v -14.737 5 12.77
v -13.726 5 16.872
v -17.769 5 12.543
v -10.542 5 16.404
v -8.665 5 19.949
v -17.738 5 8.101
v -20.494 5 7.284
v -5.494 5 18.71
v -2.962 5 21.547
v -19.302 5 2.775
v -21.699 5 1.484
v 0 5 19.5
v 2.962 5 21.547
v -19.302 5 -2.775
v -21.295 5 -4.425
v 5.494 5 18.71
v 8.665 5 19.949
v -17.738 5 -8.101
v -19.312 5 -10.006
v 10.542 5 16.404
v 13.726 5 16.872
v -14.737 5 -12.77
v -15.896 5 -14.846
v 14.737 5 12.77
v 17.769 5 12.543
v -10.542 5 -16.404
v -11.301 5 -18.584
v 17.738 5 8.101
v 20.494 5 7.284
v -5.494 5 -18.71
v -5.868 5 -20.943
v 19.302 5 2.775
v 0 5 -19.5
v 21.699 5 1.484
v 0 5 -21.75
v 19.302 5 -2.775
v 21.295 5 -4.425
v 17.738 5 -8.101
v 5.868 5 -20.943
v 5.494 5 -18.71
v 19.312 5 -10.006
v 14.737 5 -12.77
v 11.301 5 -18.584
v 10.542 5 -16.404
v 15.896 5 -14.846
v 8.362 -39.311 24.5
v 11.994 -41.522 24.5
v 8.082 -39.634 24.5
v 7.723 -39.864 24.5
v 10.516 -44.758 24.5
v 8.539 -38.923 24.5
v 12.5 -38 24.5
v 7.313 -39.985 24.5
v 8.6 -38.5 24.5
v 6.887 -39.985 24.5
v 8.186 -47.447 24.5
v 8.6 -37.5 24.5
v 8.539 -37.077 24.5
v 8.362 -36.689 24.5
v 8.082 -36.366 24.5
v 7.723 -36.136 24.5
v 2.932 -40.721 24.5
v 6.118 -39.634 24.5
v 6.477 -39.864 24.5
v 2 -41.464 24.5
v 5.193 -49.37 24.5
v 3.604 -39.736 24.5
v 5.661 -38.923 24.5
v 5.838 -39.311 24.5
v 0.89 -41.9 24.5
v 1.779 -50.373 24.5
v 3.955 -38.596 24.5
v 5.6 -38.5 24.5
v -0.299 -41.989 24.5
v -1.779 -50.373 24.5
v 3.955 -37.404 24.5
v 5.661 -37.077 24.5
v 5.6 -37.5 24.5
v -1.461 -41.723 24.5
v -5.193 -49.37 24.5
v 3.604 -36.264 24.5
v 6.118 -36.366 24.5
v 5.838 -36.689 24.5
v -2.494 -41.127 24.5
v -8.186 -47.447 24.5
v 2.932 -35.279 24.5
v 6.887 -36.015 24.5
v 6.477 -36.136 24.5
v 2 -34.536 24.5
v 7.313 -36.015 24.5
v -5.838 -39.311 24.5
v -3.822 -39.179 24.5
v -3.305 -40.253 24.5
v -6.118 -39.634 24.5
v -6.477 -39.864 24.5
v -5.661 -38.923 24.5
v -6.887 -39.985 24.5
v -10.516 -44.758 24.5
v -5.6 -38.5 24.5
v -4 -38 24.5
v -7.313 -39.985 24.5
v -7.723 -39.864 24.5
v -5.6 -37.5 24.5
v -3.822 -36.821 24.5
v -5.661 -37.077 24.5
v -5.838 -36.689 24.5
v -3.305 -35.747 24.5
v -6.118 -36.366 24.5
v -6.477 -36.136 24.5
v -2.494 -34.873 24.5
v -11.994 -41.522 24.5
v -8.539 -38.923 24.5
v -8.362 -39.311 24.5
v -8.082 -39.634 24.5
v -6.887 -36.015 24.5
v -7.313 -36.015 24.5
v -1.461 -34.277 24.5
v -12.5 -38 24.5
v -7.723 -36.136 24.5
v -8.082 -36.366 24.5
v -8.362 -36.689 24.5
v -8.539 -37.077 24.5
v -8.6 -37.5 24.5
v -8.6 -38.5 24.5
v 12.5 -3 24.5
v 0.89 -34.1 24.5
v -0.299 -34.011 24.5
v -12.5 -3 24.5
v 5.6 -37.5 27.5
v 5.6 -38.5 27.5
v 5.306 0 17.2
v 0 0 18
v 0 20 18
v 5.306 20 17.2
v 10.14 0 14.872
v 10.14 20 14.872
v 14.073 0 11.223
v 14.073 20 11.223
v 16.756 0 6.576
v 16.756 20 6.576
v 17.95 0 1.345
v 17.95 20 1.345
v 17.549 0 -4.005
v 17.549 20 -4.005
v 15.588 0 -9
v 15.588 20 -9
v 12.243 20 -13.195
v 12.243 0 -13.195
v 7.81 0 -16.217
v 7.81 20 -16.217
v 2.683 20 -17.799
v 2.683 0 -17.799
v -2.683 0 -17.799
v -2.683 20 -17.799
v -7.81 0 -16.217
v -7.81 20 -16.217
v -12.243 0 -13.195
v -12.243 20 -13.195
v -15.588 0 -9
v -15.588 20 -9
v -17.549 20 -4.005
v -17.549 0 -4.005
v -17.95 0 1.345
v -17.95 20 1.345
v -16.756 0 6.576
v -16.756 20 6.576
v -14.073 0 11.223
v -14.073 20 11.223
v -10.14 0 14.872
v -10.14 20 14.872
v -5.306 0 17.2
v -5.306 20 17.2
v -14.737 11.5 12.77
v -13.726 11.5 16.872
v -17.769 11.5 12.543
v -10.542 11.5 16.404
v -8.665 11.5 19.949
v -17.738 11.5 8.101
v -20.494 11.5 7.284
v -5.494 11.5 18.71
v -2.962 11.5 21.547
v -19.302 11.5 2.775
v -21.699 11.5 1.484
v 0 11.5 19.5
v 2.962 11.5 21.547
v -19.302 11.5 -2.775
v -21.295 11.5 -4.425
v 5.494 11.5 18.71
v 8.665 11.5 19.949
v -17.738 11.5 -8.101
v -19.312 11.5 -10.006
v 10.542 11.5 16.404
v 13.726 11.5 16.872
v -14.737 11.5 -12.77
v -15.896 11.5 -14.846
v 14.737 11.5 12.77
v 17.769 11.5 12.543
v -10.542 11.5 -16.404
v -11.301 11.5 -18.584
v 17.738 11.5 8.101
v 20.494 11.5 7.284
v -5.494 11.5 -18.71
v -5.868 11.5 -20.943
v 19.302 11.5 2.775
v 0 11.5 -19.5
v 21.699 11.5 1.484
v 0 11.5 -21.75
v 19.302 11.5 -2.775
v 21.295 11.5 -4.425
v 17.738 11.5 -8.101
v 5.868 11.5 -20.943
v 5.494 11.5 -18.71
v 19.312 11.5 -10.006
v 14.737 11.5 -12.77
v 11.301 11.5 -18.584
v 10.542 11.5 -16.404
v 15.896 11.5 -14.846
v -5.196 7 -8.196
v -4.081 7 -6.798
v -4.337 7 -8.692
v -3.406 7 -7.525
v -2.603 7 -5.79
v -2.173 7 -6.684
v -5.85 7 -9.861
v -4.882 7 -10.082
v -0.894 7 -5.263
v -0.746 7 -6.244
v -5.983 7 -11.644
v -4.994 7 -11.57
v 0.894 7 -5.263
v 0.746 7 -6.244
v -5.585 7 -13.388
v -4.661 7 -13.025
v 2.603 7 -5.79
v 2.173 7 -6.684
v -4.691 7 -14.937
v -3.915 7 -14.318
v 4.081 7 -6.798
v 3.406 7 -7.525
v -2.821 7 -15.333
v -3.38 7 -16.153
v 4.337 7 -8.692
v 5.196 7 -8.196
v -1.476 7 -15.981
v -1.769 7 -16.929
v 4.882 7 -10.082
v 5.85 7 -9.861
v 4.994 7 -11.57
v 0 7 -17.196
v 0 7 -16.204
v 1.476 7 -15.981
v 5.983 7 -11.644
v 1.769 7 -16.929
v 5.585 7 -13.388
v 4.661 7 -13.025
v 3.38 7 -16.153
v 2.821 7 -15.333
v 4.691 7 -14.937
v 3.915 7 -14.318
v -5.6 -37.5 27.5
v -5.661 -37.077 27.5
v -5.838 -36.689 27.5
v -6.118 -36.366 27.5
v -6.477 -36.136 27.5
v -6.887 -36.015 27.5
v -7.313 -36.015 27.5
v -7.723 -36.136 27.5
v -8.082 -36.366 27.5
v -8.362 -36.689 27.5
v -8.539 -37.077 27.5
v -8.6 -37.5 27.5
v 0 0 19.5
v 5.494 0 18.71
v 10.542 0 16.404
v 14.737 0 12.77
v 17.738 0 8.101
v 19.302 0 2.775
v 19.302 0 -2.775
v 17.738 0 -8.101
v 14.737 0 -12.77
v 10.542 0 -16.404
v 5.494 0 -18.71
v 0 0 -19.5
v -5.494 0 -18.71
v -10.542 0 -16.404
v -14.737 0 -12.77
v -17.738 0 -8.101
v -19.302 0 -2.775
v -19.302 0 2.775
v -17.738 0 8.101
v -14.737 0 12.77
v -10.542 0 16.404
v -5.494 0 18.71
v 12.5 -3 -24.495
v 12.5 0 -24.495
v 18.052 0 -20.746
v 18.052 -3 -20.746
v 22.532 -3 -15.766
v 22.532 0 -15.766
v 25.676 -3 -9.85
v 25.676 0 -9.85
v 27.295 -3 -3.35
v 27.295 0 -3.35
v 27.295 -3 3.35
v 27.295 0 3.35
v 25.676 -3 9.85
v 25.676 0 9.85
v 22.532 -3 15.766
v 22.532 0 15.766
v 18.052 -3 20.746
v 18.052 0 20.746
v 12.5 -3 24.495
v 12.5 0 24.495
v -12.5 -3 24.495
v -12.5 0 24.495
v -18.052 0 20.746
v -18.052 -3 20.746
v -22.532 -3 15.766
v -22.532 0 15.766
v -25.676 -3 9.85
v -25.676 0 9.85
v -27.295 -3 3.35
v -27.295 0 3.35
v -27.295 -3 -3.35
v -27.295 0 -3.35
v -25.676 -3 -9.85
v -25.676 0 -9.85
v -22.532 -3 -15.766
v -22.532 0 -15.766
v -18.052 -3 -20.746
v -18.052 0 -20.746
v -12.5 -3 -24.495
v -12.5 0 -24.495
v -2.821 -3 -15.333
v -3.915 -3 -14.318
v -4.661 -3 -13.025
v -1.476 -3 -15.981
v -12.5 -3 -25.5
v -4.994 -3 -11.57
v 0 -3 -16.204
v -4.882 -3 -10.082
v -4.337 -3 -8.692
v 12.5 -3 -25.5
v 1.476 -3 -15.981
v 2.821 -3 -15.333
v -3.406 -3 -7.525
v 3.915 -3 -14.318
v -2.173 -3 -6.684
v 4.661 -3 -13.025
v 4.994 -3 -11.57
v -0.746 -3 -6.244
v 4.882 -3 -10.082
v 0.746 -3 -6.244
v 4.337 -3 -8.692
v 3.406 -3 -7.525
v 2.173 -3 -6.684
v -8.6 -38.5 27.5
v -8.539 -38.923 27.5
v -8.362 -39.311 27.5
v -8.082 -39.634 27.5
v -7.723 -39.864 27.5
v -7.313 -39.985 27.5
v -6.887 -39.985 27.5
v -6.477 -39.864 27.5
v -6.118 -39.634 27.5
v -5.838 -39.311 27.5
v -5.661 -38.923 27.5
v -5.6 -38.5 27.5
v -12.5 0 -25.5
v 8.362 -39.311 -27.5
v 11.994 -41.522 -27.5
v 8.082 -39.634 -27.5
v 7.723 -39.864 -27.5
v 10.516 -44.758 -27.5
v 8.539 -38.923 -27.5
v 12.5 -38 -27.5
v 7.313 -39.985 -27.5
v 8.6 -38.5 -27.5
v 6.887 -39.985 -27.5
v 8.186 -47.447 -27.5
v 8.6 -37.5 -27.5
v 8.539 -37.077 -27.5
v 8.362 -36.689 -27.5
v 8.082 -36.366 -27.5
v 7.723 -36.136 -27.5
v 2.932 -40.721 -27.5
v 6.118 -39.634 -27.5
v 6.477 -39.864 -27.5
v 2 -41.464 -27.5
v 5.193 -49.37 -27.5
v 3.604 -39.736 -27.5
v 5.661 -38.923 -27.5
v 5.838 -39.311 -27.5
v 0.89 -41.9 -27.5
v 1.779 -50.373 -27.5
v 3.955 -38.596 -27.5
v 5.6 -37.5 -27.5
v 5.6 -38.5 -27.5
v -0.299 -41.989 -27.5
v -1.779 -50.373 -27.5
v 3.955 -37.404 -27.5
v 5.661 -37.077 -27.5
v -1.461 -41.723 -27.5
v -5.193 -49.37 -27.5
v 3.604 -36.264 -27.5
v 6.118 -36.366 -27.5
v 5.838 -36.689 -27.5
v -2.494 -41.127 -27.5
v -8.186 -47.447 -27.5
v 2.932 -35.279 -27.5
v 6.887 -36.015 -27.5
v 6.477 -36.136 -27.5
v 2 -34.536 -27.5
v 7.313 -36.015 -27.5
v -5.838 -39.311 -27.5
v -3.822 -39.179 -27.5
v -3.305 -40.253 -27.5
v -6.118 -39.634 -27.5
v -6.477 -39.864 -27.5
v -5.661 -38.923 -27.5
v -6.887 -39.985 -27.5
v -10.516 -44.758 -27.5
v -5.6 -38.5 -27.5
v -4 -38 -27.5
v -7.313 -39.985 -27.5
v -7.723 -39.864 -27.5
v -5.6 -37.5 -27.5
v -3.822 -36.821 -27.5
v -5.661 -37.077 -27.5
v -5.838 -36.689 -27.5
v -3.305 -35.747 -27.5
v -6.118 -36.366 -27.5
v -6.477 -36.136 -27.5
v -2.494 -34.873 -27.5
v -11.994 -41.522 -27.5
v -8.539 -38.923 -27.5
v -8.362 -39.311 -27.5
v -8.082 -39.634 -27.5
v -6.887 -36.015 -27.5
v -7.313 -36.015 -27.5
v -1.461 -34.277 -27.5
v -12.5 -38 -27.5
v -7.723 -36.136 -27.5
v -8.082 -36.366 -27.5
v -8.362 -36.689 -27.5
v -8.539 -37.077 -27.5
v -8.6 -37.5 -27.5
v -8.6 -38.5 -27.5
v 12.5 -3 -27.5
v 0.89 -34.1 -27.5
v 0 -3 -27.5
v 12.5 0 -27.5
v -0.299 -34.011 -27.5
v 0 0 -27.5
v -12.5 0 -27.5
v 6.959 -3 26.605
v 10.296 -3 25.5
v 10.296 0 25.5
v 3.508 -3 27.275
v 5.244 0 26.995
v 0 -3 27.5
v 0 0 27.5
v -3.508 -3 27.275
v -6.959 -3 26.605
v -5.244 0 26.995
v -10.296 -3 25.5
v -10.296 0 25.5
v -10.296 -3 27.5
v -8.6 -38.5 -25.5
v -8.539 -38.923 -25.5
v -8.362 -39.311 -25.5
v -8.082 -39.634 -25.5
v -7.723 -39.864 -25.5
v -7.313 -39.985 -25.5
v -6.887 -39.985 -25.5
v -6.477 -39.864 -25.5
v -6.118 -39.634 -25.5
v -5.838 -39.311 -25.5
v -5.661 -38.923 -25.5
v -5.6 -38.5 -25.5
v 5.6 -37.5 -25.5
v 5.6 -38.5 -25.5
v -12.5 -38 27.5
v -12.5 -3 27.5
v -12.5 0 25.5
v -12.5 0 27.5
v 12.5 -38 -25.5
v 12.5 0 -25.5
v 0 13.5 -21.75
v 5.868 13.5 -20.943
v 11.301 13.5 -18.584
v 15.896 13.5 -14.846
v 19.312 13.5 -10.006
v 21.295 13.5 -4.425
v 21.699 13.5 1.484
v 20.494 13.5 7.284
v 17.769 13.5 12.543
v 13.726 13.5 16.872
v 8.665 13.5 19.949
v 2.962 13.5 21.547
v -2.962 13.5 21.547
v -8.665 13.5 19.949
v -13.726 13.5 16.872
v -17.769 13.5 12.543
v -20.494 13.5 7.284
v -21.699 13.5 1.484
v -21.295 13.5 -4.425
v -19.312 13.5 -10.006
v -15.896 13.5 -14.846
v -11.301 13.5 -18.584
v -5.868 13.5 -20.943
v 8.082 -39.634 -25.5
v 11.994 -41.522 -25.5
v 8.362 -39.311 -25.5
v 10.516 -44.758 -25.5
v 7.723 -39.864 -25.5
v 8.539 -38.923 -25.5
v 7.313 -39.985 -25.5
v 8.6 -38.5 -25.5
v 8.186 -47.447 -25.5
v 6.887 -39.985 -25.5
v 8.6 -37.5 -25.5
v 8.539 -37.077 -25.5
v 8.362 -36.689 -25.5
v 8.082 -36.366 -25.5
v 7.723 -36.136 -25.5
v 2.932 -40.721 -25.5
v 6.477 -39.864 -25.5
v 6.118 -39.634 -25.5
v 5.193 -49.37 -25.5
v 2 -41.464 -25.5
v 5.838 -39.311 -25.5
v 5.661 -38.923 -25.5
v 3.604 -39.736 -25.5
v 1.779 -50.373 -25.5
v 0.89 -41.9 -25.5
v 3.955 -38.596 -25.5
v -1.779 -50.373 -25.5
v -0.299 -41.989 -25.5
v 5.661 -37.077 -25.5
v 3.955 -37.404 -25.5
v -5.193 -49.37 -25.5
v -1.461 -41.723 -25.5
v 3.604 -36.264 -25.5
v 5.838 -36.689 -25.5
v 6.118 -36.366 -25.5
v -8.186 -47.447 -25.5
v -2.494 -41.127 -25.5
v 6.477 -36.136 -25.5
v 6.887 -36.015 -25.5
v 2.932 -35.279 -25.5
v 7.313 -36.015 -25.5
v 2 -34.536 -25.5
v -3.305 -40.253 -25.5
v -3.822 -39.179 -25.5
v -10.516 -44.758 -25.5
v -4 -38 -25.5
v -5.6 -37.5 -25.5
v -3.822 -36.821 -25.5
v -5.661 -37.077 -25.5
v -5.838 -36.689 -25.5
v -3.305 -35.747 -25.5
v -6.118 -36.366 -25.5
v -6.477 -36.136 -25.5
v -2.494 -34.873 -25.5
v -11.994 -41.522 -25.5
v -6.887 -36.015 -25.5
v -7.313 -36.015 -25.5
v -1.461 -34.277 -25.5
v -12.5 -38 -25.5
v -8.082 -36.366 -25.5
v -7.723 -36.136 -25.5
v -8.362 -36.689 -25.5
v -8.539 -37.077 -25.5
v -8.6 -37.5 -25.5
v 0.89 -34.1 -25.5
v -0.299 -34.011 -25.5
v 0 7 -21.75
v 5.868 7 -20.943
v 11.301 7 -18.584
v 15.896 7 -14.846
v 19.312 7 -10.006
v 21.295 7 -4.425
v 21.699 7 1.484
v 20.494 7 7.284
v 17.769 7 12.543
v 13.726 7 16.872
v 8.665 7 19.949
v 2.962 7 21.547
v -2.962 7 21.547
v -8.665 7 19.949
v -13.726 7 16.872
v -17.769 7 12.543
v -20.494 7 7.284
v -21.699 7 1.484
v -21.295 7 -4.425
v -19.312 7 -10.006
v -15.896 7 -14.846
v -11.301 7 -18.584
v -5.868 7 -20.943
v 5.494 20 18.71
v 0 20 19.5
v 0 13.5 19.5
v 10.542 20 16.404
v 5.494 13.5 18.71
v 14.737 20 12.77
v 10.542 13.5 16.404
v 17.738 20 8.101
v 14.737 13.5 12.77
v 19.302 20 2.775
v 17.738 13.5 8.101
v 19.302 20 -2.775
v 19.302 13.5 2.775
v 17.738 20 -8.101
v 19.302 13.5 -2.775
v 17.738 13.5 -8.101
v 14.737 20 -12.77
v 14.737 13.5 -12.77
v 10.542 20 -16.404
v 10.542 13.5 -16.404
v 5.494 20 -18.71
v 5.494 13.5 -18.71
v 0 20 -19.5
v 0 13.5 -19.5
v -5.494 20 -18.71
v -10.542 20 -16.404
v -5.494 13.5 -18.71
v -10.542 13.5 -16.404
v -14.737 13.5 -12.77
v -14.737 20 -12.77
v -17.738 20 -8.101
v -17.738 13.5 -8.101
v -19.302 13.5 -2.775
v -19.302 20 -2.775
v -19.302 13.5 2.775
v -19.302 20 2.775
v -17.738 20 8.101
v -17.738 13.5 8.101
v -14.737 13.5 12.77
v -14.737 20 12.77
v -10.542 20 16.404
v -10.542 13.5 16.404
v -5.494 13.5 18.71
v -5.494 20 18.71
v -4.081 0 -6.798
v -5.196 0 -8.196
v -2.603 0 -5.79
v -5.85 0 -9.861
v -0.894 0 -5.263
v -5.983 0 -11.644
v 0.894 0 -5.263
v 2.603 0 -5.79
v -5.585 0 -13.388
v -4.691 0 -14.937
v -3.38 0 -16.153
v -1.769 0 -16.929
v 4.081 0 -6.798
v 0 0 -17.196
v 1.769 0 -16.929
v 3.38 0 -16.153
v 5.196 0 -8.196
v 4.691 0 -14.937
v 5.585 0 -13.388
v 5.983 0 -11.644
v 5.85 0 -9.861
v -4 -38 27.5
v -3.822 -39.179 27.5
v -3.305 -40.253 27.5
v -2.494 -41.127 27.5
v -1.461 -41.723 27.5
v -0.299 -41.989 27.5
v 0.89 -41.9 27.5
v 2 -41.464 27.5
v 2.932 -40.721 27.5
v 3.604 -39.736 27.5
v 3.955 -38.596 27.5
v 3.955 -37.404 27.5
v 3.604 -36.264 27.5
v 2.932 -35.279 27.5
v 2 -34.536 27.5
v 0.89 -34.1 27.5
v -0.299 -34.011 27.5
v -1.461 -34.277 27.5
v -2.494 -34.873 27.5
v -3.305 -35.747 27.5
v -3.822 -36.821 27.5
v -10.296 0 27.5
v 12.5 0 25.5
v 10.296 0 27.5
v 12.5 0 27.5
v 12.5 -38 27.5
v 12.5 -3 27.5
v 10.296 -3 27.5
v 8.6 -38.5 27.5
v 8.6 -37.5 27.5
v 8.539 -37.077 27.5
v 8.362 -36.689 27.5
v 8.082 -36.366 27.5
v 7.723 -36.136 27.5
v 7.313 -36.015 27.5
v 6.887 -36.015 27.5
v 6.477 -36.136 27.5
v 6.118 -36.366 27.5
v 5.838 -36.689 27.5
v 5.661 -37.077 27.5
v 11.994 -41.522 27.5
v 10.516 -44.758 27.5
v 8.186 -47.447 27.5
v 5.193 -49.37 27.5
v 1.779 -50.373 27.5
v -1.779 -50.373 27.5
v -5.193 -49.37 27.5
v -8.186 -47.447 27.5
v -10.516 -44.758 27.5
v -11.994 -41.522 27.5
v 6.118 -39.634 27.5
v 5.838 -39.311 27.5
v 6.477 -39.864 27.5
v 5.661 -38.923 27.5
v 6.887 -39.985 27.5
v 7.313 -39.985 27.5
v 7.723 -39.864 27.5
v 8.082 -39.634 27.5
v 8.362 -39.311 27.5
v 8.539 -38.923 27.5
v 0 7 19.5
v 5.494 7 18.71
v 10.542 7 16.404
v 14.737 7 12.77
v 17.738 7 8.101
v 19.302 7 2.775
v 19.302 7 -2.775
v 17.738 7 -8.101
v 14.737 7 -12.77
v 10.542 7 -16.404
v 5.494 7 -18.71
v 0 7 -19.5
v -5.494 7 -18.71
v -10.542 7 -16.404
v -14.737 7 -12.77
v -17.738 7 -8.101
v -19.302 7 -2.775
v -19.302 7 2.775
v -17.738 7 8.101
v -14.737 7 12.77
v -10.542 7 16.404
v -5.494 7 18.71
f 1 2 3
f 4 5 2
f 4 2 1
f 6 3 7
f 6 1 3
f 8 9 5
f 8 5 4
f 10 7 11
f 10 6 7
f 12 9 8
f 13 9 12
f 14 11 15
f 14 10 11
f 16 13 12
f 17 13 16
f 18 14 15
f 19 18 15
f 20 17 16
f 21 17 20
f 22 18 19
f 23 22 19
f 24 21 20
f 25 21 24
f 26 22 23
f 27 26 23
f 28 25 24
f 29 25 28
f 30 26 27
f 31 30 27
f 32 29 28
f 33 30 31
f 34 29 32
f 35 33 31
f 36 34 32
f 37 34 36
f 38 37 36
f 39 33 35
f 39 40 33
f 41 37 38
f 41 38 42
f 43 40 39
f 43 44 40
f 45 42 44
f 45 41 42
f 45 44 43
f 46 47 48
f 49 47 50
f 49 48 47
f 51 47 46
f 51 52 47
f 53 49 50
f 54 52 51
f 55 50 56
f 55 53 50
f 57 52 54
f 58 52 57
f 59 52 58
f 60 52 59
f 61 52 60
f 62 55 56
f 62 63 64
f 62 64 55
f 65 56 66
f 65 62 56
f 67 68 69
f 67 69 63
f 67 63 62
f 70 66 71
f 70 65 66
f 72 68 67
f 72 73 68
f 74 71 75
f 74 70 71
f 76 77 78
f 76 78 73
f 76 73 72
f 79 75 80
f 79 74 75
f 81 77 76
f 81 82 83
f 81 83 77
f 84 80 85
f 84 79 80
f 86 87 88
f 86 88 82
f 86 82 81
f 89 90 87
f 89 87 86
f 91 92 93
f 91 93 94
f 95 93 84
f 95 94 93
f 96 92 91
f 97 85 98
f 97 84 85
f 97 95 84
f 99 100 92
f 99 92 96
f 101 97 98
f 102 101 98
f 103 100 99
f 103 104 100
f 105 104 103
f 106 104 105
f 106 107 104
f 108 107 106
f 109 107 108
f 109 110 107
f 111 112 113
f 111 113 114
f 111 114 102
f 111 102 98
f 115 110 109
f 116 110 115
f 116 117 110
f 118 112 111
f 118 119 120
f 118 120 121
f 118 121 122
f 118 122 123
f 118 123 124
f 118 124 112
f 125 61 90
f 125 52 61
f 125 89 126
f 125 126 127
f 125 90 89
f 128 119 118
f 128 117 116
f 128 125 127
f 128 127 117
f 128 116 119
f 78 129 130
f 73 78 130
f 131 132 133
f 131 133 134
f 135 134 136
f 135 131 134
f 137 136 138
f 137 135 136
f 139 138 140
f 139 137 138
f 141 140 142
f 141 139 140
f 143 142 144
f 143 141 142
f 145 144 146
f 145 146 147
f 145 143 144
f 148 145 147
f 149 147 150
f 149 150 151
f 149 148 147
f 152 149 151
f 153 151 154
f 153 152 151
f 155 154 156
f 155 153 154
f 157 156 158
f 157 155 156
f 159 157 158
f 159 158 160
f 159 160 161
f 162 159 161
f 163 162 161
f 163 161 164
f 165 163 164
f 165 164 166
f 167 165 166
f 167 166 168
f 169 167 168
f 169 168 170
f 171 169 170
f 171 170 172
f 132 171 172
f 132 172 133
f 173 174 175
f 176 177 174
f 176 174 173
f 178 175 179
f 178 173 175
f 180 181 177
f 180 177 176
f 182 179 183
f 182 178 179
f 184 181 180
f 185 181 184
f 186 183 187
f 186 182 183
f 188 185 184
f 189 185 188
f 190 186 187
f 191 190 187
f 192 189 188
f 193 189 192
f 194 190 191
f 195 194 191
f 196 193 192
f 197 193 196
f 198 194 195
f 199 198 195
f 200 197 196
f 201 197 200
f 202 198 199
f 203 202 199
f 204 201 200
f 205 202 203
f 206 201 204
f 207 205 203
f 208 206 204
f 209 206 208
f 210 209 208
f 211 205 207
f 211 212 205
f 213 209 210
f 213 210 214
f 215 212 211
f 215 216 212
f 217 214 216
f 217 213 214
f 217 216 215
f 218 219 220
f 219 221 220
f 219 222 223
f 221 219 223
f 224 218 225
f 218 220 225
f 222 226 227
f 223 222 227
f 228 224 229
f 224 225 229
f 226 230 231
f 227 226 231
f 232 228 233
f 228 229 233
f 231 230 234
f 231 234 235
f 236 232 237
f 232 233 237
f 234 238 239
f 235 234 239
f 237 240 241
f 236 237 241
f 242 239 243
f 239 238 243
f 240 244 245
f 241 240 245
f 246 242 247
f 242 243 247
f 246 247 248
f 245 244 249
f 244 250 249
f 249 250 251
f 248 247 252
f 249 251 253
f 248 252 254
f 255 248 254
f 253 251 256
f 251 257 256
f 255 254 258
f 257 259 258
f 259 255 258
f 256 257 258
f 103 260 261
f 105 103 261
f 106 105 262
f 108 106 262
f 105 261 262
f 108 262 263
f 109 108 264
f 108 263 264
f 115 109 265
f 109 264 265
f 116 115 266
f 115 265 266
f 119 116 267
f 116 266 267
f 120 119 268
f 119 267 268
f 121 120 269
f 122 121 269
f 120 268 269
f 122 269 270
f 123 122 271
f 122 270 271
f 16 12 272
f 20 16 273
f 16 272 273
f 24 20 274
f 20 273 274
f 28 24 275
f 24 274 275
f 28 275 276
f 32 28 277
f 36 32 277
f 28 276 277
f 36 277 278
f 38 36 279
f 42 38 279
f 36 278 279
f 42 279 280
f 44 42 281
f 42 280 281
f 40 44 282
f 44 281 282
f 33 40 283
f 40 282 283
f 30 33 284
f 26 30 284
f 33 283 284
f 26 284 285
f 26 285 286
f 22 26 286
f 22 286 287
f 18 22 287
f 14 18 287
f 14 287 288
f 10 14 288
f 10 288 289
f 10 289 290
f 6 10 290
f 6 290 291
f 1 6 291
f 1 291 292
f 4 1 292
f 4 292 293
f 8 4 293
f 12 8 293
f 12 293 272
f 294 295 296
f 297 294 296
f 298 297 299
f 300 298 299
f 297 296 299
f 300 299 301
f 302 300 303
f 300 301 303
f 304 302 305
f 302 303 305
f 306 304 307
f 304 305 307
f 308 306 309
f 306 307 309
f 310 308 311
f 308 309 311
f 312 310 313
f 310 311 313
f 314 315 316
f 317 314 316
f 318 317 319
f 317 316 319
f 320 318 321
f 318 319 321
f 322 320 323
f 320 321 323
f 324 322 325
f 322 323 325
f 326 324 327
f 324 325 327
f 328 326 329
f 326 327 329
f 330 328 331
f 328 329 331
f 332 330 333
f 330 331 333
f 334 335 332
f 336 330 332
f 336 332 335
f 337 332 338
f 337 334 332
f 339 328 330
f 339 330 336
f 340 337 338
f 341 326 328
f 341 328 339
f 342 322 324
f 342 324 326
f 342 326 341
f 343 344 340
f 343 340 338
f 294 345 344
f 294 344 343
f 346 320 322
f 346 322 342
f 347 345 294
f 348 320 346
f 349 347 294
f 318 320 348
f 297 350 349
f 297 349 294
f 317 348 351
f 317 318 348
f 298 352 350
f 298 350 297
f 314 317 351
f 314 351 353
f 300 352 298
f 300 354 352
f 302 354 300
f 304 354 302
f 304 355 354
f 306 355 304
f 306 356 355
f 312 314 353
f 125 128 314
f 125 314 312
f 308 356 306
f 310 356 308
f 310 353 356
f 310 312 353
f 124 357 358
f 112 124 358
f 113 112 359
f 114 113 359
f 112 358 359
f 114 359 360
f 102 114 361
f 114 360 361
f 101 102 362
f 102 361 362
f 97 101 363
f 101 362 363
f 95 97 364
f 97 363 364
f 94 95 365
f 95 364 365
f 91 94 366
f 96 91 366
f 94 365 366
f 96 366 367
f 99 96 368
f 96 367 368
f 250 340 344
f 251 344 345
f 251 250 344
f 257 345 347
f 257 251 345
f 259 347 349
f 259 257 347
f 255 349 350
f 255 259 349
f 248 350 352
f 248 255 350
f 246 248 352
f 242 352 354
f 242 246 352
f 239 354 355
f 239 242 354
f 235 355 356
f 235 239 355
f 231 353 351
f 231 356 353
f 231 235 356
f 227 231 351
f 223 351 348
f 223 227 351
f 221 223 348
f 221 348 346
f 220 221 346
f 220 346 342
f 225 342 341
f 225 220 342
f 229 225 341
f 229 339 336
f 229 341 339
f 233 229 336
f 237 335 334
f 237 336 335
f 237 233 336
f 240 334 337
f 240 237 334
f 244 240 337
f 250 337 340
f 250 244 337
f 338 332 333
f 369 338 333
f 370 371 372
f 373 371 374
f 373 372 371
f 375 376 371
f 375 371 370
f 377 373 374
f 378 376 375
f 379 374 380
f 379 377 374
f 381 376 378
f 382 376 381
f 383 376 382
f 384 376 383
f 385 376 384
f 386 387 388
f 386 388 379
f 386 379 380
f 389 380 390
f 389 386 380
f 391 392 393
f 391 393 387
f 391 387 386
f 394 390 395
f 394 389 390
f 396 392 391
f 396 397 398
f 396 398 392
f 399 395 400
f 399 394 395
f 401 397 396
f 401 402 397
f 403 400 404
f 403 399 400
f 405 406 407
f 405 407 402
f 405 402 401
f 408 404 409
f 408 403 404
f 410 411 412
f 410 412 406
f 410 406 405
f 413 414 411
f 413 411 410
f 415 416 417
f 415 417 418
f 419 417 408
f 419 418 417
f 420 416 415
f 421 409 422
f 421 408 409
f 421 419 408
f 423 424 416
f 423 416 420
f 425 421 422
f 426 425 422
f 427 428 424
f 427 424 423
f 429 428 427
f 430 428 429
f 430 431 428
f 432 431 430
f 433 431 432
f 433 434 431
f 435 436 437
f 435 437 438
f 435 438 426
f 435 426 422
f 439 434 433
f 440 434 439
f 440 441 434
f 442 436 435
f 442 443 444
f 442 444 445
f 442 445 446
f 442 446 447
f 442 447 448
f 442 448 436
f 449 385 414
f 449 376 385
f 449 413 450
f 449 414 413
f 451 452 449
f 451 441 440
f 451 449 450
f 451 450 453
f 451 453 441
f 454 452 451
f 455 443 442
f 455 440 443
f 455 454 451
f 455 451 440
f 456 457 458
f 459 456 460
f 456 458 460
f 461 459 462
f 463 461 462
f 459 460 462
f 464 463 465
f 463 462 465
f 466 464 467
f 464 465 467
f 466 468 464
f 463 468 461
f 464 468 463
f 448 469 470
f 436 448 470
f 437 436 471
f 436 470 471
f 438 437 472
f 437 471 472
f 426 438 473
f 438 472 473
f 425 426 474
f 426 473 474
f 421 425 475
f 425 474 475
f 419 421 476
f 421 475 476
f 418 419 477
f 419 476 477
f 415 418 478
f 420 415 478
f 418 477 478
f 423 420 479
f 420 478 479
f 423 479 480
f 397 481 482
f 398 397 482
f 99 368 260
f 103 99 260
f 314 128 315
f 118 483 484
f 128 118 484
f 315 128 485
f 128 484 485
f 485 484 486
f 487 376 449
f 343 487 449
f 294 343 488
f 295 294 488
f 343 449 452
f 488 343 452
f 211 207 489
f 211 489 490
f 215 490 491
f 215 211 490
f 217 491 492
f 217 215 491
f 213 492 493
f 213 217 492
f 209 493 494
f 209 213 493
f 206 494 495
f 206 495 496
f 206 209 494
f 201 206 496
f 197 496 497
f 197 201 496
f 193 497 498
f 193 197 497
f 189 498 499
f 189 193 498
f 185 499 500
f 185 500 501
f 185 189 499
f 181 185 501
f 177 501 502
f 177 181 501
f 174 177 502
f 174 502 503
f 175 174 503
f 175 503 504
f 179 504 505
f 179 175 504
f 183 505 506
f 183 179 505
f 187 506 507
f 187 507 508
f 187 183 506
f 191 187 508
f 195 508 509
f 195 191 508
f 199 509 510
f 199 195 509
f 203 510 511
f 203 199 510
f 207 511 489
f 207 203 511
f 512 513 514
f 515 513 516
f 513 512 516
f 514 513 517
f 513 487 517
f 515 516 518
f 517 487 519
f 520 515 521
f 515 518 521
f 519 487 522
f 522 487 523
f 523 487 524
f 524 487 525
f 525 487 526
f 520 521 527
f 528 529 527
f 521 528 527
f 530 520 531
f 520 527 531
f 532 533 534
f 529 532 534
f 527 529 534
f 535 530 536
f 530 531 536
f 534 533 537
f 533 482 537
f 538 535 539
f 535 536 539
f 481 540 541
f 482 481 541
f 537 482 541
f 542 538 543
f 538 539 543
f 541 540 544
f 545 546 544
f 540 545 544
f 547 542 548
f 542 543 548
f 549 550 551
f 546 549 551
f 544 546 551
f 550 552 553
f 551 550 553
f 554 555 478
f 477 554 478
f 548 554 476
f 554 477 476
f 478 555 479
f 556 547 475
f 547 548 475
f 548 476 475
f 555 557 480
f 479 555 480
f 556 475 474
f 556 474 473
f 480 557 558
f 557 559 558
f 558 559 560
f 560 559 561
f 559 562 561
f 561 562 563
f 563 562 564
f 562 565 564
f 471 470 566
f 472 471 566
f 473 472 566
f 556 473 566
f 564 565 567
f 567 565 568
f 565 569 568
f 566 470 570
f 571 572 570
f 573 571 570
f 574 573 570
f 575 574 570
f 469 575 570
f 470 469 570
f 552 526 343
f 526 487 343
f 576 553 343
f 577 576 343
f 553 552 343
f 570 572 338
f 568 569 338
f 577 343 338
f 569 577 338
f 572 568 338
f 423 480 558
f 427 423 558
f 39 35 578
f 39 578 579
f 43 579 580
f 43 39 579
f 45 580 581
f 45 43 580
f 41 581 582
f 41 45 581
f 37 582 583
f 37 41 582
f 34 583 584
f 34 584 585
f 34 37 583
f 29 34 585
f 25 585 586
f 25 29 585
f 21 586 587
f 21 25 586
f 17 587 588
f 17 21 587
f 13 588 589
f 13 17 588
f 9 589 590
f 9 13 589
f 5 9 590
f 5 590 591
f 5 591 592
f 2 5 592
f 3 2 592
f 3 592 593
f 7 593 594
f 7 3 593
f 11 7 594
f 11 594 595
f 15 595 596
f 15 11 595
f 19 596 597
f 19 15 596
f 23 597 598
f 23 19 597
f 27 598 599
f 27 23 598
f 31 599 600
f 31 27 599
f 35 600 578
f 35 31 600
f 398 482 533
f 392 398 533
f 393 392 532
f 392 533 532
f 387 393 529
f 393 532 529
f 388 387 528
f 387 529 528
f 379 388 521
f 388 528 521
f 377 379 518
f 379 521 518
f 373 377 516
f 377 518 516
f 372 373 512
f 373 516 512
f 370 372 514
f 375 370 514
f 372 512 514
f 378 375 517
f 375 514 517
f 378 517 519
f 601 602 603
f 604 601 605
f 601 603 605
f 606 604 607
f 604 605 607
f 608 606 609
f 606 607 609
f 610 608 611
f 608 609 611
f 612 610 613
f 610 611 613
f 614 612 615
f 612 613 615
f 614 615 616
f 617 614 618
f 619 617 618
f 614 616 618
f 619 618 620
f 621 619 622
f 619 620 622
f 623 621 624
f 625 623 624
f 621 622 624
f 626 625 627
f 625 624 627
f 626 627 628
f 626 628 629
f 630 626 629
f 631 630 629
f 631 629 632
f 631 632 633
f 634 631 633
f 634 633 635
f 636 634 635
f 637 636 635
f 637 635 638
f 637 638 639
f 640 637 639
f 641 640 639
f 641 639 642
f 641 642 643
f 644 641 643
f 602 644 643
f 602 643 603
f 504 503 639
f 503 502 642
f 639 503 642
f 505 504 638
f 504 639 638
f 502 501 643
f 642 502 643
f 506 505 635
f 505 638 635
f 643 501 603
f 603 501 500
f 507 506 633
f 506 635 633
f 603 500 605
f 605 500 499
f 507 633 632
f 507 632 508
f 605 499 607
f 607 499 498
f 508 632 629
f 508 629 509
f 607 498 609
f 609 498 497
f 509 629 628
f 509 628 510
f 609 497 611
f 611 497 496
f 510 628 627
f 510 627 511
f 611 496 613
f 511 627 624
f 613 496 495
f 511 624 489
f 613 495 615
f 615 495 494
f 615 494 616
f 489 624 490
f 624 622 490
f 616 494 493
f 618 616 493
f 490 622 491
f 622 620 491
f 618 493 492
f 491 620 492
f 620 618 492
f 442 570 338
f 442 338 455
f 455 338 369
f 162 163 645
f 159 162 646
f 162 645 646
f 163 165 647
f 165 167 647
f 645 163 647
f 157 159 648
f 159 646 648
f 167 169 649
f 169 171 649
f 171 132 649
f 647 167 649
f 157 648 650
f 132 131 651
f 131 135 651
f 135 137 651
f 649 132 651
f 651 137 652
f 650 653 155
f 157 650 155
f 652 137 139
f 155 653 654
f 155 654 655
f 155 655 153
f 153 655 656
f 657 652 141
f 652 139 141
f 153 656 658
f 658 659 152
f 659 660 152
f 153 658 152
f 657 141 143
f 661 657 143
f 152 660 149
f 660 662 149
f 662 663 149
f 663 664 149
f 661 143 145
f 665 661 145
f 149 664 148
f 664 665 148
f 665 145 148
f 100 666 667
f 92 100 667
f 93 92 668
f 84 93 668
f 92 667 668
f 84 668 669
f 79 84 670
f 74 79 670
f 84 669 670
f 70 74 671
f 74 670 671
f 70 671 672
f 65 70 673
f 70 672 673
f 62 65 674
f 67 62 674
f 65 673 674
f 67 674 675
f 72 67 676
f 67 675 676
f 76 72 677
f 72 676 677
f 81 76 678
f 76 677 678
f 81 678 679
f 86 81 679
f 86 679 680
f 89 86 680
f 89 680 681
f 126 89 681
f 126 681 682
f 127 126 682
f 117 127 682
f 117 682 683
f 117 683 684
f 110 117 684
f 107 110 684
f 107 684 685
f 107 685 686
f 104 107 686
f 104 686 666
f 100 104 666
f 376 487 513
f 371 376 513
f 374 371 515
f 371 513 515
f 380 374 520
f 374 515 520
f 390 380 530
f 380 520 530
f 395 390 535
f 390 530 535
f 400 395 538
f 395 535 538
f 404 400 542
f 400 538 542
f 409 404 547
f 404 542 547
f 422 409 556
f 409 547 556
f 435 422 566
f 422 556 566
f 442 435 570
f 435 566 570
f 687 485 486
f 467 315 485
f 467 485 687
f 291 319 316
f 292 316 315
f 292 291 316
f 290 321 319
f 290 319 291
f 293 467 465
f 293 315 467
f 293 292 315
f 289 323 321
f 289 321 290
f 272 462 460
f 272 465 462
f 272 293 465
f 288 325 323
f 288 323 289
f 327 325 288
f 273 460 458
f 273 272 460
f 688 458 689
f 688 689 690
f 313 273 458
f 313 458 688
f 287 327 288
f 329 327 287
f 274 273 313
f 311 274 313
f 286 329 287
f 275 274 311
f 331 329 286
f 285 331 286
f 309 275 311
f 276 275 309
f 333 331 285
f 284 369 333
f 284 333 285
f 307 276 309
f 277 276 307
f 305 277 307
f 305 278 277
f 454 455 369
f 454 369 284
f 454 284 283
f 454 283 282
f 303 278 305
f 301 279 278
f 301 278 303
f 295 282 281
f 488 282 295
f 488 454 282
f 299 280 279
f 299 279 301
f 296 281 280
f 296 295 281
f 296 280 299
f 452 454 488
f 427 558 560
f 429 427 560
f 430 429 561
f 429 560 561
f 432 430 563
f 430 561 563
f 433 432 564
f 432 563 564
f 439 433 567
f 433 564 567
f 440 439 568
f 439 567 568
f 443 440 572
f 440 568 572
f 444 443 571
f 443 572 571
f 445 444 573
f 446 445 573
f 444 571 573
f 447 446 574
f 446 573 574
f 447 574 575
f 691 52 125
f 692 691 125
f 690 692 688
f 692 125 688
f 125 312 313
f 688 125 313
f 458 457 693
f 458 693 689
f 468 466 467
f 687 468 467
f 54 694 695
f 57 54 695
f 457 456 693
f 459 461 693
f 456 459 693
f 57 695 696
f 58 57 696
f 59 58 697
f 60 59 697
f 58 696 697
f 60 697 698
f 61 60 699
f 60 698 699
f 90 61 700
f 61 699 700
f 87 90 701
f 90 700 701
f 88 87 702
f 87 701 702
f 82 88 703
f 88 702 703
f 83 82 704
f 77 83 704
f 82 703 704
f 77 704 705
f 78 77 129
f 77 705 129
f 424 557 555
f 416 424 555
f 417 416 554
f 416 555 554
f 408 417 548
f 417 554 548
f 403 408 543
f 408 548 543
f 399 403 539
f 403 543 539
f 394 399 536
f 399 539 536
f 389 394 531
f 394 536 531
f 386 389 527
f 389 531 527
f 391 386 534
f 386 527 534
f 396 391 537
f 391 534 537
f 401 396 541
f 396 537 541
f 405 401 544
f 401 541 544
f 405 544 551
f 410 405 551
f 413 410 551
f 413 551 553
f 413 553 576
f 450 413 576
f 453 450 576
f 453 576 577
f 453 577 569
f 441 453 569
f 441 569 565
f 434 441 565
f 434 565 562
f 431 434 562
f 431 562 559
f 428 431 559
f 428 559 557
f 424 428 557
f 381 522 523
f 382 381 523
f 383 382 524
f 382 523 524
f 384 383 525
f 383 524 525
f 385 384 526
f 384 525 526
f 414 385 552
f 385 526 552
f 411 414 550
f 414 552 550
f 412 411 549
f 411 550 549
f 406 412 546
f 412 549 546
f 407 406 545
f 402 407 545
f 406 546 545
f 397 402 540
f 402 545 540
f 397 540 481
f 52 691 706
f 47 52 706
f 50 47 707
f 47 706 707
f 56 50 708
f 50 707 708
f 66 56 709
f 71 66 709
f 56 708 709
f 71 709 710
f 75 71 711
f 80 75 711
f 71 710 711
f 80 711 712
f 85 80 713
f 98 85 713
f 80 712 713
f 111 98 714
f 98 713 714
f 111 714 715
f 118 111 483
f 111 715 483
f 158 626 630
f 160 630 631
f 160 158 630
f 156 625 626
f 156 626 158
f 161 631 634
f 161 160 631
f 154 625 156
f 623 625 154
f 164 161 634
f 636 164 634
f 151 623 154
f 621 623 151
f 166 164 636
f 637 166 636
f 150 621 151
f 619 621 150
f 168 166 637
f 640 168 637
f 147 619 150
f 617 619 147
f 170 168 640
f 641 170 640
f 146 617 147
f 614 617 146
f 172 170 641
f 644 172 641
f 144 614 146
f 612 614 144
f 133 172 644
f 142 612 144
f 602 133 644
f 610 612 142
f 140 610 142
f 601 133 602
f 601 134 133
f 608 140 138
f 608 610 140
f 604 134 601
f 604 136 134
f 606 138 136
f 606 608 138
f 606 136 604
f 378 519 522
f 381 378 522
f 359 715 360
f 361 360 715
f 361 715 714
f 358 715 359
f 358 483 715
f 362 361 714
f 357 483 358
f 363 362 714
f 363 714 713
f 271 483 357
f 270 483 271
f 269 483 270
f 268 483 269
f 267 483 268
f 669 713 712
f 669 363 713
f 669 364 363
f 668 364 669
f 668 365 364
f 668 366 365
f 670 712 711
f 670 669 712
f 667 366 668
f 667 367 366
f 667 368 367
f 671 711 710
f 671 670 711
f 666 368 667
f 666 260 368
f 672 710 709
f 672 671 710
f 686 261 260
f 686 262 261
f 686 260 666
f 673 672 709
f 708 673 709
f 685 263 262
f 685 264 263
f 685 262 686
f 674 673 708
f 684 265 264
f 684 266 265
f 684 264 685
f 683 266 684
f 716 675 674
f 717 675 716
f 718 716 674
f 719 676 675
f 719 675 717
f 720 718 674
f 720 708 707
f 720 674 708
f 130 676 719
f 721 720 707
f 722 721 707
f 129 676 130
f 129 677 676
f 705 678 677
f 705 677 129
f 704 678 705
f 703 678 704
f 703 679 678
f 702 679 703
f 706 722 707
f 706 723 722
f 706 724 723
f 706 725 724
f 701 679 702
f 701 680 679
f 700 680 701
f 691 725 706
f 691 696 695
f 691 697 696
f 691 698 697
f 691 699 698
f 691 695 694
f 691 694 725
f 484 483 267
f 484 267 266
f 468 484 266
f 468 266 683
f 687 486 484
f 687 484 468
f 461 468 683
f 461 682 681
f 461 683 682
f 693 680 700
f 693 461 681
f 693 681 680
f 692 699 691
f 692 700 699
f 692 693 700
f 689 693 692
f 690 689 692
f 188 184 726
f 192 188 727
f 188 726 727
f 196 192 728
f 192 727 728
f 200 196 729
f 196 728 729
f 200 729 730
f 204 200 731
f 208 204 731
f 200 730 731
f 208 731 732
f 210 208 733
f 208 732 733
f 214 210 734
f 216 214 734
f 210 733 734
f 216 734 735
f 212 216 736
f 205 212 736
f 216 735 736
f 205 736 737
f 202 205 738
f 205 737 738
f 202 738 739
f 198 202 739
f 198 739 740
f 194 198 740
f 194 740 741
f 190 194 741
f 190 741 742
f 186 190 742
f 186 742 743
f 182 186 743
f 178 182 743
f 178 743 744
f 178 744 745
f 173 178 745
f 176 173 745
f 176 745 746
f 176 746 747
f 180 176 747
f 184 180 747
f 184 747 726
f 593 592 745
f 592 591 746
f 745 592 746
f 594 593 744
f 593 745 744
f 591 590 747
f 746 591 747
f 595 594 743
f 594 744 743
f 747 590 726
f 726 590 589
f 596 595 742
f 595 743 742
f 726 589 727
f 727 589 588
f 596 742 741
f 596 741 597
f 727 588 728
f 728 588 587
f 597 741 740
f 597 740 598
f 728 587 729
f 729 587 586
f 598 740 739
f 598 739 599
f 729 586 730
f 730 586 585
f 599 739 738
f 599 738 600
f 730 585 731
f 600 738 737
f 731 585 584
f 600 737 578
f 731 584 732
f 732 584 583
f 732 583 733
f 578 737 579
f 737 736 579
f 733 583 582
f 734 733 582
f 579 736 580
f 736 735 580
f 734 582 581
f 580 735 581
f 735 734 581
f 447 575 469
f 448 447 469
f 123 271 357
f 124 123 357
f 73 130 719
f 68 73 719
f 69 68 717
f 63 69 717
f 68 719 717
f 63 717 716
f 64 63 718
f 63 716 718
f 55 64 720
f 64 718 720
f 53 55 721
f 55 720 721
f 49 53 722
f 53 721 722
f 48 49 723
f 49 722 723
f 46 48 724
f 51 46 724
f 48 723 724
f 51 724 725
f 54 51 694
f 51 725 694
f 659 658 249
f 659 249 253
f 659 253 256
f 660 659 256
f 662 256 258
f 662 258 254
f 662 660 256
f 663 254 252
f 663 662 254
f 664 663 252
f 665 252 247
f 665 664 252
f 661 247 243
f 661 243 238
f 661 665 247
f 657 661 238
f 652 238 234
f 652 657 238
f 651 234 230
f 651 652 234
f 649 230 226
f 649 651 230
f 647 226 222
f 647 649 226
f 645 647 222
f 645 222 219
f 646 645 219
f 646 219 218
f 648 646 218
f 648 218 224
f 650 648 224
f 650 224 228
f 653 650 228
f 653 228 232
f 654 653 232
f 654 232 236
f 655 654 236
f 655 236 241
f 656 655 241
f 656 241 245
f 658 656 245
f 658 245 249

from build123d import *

# Parameters (mm, degrees)
SKETCH_1_R               = 19.5
SKETCH_1_R_2             = 18
EXTRUDE_1_DEPTH          = 20
SKETCH_3_R               = 27.5
EXTRUDE_2_DEPTH          = 3
SKETCH_10_R              = 6
SKETCH_10_R_2            = 5
EXTRUDE_6_DEPTH          = 10
CUT_EXTRUDE_4_DEPTH      = 19
CUT_EXTRUDE_4_DEPTH_BACK = 10
SKETCH_11_R              = 5.007506695
EXTRUDE_START            = 2
SKETCH_25_R              = 21.75
SKETCH_25_R_2            = 19.5
EXTRUDE_12_DEPTH         = 2
EXTRUDE_START_2          = -1
SKETCH_26_R              = 21.75
SKETCH_26_R_2            = 19.5
EXTRUDE_13_DEPTH         = 2
SKETCH_27_W              = 25
SKETCH_27_H              = 51
SKETCH_27_R              = 5.007506695
EXTRUDE_14_DEPTH         = 3
SKETCH_28_R              = 4
EXTRUDE_17_DEPTH         = 2
EXTRUDE_START_3          = -53
SKETCH_28_15_R           = 4
EXTRUDE_19_DEPTH         = 53
SKETCH_32_W              = 2.204369859
SKETCH_32_H              = 3
EXTRUDE_20_DEPTH         = 2
CUT_EXTRUDE_START        = -50
SKETCH_28_18_R           = 4
CUT_EXTRUDE_8_DEPTH      = 50


with BuildPart() as part:
    # 草圖1 → 填料-伸長1 (new body)
    with BuildSketch(Plane(origin=(0, 0, 0), x_dir=(1, 0, 0), z_dir=(0, 1, 0))):
        Circle(SKETCH_1_R)
        Circle(SKETCH_1_R_2, mode=Mode.SUBTRACT)
    extrude(amount=EXTRUDE_1_DEPTH)

    # 草圖3 → 填料-伸長2 (add)
    with BuildSketch(Plane.XZ):
        Circle(SKETCH_3_R)
    extrude(amount=EXTRUDE_2_DEPTH)

    # 草圖10 → 填料-伸長6 (add)
    with BuildSketch(Plane(origin=(0, -3, 0), x_dir=(-1, 0, 0), z_dir=(0, -1, 0))):
        with Locations((0, 11.196036894)):
            Circle(SKETCH_10_R)
        with Locations((0, 11.196036894)):
            Circle(SKETCH_10_R_2, mode=Mode.SUBTRACT)
    extrude(amount=-EXTRUDE_6_DEPTH)

    # 草圖11 → 除料-伸長4 (cut, two sides: drawn at the far end of the back side and taken through both)
    with BuildSketch(Plane(origin=(0, -3, 0), x_dir=(-1, 0, 0), z_dir=(0, -1, 0)).offset(-CUT_EXTRUDE_4_DEPTH_BACK)):
        with Locations((0, 11.196036894)):
            Circle(SKETCH_11_R)
    extrude(amount=CUT_EXTRUDE_4_DEPTH + CUT_EXTRUDE_4_DEPTH_BACK, mode=Mode.SUBTRACT)

    # 草圖25 → 填料-伸長12 (add)
    with BuildSketch(Plane(origin=(0, 7, 0), x_dir=(-1, 0, 0), z_dir=(0, -1, 0)).offset(EXTRUDE_START)):
        Circle(SKETCH_25_R)
        Circle(SKETCH_25_R_2, mode=Mode.SUBTRACT)
    extrude(amount=-EXTRUDE_12_DEPTH)

    # 草圖26 → 填料-伸長13 (add)
    with BuildSketch(Plane(origin=(0, 10.5, 0), x_dir=(-1, 0, 0), z_dir=(0, -1, 0)).offset(EXTRUDE_START_2)):
        Circle(SKETCH_26_R)
        Circle(SKETCH_26_R_2, mode=Mode.SUBTRACT)
    extrude(amount=-EXTRUDE_13_DEPTH)

    # 草圖27 → 填料-伸長14 (add)
    with BuildSketch(Plane.XZ.offset(3)):
        Rectangle(SKETCH_27_W, SKETCH_27_H)
        with Locations((0, -11.196036894)):
            Circle(SKETCH_27_R, mode=Mode.SUBTRACT)
    extrude(amount=-EXTRUDE_14_DEPTH)

    # 草圖28 → 填料-伸長17 (add)
    with BuildSketch(Plane(origin=(0, 0, -25.5), x_dir=(-1, 0, 0), z_dir=(0, 0, -1))):
        with BuildLine():
            Line((12.5, 0), (-12.5, 0))
            Line((-12.5, 0), (-12.5, -38))
            ThreePointArc((-12.5, -38), (0, -50.5), (12.5, -38))
            Line((12.5, -38), (12.5, 0))
        make_face()
        with BuildLine():
            Line((8.6, -37.5), (8.6, -38.5))
            ThreePointArc((8.6, -38.5), (7.1, -40), (5.6, -38.5))
            Line((5.6, -38.5), (5.6, -37.5))
            ThreePointArc((5.6, -37.5), (7.1, -36), (8.6, -37.5))
        make_face(mode=Mode.SUBTRACT)
        with Locations((0, -38)):
            Circle(SKETCH_28_R, mode=Mode.SUBTRACT)
        with BuildLine():
            Line((-5.6, -37.5), (-5.6, -38.5))
            ThreePointArc((-5.6, -38.5), (-7.1, -40), (-8.6, -38.5))
            Line((-8.6, -38.5), (-8.6, -37.5))
            ThreePointArc((-8.6, -37.5), (-7.1, -36), (-5.6, -37.5))
        make_face(mode=Mode.SUBTRACT)
    extrude(amount=EXTRUDE_17_DEPTH)

    # 草圖28<15> → 填料-伸長19 (add)
    with BuildSketch(Plane(origin=(0, 0, -25.5), x_dir=(-1, 0, 0), z_dir=(0, 0, -1)).offset(EXTRUDE_START_3)):
        with BuildLine():
            Line((12.5, -38), (12.5, -3))
            Line((12.5, -3), (-12.5, -3))
            Line((-12.5, -3), (-12.5, -38))
            ThreePointArc((-12.5, -38), (0, -50.5), (12.5, -38))
        make_face()
        with BuildLine():
            Line((8.6, -37.5), (8.6, -38.5))
            ThreePointArc((8.6, -38.5), (7.1, -40), (5.6, -38.5))
            Line((5.6, -38.5), (5.6, -37.5))
            ThreePointArc((5.6, -37.5), (7.1, -36), (8.6, -37.5))
        make_face(mode=Mode.SUBTRACT)
        with Locations((0, -38)):
            Circle(SKETCH_28_15_R, mode=Mode.SUBTRACT)
        with BuildLine():
            Line((-5.6, -37.5), (-5.6, -38.5))
            ThreePointArc((-5.6, -38.5), (-7.1, -40), (-8.6, -38.5))
            Line((-8.6, -38.5), (-8.6, -37.5))
            ThreePointArc((-8.6, -37.5), (-7.1, -36), (-5.6, -37.5))
        make_face(mode=Mode.SUBTRACT)
    extrude(amount=EXTRUDE_19_DEPTH)

    # 草圖32 → 填料-伸長20 (add)
    with BuildSketch(Plane.XY.offset(25.5)):
        with Locations((11.397815071, -1.5)):
            Rectangle(SKETCH_32_W, SKETCH_32_H)
        with Locations((-11.397815071, -1.5)):
            Rectangle(SKETCH_32_W, SKETCH_32_H)
    extrude(amount=EXTRUDE_20_DEPTH)

    # 草圖28<18> → 除料-伸長8 (cut)
    with BuildSketch(Plane(origin=(0, 0, -25.5), x_dir=(-1, 0, 0), z_dir=(0, 0, -1)).offset(CUT_EXTRUDE_START)):
        with BuildLine():
            Line((12.5, -38), (12.5, -3))
            Line((12.5, -3), (-12.5, -3))
            Line((-12.5, -3), (-12.5, -38))
            ThreePointArc((-12.5, -38), (0, -50.5), (12.5, -38))
        make_face()
        with BuildLine():
            Line((8.6, -37.5), (8.6, -38.5))
            ThreePointArc((8.6, -38.5), (7.1, -40), (5.6, -38.5))
            Line((5.6, -38.5), (5.6, -37.5))
            ThreePointArc((5.6, -37.5), (7.1, -36), (8.6, -37.5))
        make_face(mode=Mode.SUBTRACT)
        with Locations((0, -38)):
            Circle(SKETCH_28_18_R, mode=Mode.SUBTRACT)
        with BuildLine():
            Line((-5.6, -37.5), (-5.6, -38.5))
            ThreePointArc((-5.6, -38.5), (-7.1, -40), (-8.6, -38.5))
            Line((-8.6, -38.5), (-8.6, -37.5))
            ThreePointArc((-8.6, -37.5), (-7.1, -36), (-5.6, -37.5))
        make_face(mode=Mode.SUBTRACT)
    extrude(amount=CUT_EXTRUDE_8_DEPTH, mode=Mode.SUBTRACT)


solid = part.part
